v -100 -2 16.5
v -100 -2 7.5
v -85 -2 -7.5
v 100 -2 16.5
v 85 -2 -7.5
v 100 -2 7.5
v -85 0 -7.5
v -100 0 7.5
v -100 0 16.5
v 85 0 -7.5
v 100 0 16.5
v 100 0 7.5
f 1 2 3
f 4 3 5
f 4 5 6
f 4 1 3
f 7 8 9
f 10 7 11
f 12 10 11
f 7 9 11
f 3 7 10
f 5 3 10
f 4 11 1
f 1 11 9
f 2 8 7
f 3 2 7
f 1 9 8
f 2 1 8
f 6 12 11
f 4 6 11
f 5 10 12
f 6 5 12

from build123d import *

# Parameters (mm, degrees)
F0_W     = 170
F0_H     = 15
F1_DEPTH = 2


# Not quite as in the source:
# - a feature names something its author has since deleted; it is built from what else it names


with BuildPart() as f1:
    # F0 (on Front) → F1 (new body)
    with BuildSketch(Plane.XZ):
        Rectangle(F0_W, F0_H)
        Polygon((-100, 7.5), (-85, -7.5), (-85, 7.5), align=None)
        Polygon((85, 7.5), (85, -7.5), (100, 7.5), align=None)
        Polygon((-85, 7.5), (85, 7.5), (100, 7.5), (100, 16.5), (-100, 16.5), (-100, 7.5), align=None)
    extrude(amount=F1_DEPTH)


solid = f1.part
